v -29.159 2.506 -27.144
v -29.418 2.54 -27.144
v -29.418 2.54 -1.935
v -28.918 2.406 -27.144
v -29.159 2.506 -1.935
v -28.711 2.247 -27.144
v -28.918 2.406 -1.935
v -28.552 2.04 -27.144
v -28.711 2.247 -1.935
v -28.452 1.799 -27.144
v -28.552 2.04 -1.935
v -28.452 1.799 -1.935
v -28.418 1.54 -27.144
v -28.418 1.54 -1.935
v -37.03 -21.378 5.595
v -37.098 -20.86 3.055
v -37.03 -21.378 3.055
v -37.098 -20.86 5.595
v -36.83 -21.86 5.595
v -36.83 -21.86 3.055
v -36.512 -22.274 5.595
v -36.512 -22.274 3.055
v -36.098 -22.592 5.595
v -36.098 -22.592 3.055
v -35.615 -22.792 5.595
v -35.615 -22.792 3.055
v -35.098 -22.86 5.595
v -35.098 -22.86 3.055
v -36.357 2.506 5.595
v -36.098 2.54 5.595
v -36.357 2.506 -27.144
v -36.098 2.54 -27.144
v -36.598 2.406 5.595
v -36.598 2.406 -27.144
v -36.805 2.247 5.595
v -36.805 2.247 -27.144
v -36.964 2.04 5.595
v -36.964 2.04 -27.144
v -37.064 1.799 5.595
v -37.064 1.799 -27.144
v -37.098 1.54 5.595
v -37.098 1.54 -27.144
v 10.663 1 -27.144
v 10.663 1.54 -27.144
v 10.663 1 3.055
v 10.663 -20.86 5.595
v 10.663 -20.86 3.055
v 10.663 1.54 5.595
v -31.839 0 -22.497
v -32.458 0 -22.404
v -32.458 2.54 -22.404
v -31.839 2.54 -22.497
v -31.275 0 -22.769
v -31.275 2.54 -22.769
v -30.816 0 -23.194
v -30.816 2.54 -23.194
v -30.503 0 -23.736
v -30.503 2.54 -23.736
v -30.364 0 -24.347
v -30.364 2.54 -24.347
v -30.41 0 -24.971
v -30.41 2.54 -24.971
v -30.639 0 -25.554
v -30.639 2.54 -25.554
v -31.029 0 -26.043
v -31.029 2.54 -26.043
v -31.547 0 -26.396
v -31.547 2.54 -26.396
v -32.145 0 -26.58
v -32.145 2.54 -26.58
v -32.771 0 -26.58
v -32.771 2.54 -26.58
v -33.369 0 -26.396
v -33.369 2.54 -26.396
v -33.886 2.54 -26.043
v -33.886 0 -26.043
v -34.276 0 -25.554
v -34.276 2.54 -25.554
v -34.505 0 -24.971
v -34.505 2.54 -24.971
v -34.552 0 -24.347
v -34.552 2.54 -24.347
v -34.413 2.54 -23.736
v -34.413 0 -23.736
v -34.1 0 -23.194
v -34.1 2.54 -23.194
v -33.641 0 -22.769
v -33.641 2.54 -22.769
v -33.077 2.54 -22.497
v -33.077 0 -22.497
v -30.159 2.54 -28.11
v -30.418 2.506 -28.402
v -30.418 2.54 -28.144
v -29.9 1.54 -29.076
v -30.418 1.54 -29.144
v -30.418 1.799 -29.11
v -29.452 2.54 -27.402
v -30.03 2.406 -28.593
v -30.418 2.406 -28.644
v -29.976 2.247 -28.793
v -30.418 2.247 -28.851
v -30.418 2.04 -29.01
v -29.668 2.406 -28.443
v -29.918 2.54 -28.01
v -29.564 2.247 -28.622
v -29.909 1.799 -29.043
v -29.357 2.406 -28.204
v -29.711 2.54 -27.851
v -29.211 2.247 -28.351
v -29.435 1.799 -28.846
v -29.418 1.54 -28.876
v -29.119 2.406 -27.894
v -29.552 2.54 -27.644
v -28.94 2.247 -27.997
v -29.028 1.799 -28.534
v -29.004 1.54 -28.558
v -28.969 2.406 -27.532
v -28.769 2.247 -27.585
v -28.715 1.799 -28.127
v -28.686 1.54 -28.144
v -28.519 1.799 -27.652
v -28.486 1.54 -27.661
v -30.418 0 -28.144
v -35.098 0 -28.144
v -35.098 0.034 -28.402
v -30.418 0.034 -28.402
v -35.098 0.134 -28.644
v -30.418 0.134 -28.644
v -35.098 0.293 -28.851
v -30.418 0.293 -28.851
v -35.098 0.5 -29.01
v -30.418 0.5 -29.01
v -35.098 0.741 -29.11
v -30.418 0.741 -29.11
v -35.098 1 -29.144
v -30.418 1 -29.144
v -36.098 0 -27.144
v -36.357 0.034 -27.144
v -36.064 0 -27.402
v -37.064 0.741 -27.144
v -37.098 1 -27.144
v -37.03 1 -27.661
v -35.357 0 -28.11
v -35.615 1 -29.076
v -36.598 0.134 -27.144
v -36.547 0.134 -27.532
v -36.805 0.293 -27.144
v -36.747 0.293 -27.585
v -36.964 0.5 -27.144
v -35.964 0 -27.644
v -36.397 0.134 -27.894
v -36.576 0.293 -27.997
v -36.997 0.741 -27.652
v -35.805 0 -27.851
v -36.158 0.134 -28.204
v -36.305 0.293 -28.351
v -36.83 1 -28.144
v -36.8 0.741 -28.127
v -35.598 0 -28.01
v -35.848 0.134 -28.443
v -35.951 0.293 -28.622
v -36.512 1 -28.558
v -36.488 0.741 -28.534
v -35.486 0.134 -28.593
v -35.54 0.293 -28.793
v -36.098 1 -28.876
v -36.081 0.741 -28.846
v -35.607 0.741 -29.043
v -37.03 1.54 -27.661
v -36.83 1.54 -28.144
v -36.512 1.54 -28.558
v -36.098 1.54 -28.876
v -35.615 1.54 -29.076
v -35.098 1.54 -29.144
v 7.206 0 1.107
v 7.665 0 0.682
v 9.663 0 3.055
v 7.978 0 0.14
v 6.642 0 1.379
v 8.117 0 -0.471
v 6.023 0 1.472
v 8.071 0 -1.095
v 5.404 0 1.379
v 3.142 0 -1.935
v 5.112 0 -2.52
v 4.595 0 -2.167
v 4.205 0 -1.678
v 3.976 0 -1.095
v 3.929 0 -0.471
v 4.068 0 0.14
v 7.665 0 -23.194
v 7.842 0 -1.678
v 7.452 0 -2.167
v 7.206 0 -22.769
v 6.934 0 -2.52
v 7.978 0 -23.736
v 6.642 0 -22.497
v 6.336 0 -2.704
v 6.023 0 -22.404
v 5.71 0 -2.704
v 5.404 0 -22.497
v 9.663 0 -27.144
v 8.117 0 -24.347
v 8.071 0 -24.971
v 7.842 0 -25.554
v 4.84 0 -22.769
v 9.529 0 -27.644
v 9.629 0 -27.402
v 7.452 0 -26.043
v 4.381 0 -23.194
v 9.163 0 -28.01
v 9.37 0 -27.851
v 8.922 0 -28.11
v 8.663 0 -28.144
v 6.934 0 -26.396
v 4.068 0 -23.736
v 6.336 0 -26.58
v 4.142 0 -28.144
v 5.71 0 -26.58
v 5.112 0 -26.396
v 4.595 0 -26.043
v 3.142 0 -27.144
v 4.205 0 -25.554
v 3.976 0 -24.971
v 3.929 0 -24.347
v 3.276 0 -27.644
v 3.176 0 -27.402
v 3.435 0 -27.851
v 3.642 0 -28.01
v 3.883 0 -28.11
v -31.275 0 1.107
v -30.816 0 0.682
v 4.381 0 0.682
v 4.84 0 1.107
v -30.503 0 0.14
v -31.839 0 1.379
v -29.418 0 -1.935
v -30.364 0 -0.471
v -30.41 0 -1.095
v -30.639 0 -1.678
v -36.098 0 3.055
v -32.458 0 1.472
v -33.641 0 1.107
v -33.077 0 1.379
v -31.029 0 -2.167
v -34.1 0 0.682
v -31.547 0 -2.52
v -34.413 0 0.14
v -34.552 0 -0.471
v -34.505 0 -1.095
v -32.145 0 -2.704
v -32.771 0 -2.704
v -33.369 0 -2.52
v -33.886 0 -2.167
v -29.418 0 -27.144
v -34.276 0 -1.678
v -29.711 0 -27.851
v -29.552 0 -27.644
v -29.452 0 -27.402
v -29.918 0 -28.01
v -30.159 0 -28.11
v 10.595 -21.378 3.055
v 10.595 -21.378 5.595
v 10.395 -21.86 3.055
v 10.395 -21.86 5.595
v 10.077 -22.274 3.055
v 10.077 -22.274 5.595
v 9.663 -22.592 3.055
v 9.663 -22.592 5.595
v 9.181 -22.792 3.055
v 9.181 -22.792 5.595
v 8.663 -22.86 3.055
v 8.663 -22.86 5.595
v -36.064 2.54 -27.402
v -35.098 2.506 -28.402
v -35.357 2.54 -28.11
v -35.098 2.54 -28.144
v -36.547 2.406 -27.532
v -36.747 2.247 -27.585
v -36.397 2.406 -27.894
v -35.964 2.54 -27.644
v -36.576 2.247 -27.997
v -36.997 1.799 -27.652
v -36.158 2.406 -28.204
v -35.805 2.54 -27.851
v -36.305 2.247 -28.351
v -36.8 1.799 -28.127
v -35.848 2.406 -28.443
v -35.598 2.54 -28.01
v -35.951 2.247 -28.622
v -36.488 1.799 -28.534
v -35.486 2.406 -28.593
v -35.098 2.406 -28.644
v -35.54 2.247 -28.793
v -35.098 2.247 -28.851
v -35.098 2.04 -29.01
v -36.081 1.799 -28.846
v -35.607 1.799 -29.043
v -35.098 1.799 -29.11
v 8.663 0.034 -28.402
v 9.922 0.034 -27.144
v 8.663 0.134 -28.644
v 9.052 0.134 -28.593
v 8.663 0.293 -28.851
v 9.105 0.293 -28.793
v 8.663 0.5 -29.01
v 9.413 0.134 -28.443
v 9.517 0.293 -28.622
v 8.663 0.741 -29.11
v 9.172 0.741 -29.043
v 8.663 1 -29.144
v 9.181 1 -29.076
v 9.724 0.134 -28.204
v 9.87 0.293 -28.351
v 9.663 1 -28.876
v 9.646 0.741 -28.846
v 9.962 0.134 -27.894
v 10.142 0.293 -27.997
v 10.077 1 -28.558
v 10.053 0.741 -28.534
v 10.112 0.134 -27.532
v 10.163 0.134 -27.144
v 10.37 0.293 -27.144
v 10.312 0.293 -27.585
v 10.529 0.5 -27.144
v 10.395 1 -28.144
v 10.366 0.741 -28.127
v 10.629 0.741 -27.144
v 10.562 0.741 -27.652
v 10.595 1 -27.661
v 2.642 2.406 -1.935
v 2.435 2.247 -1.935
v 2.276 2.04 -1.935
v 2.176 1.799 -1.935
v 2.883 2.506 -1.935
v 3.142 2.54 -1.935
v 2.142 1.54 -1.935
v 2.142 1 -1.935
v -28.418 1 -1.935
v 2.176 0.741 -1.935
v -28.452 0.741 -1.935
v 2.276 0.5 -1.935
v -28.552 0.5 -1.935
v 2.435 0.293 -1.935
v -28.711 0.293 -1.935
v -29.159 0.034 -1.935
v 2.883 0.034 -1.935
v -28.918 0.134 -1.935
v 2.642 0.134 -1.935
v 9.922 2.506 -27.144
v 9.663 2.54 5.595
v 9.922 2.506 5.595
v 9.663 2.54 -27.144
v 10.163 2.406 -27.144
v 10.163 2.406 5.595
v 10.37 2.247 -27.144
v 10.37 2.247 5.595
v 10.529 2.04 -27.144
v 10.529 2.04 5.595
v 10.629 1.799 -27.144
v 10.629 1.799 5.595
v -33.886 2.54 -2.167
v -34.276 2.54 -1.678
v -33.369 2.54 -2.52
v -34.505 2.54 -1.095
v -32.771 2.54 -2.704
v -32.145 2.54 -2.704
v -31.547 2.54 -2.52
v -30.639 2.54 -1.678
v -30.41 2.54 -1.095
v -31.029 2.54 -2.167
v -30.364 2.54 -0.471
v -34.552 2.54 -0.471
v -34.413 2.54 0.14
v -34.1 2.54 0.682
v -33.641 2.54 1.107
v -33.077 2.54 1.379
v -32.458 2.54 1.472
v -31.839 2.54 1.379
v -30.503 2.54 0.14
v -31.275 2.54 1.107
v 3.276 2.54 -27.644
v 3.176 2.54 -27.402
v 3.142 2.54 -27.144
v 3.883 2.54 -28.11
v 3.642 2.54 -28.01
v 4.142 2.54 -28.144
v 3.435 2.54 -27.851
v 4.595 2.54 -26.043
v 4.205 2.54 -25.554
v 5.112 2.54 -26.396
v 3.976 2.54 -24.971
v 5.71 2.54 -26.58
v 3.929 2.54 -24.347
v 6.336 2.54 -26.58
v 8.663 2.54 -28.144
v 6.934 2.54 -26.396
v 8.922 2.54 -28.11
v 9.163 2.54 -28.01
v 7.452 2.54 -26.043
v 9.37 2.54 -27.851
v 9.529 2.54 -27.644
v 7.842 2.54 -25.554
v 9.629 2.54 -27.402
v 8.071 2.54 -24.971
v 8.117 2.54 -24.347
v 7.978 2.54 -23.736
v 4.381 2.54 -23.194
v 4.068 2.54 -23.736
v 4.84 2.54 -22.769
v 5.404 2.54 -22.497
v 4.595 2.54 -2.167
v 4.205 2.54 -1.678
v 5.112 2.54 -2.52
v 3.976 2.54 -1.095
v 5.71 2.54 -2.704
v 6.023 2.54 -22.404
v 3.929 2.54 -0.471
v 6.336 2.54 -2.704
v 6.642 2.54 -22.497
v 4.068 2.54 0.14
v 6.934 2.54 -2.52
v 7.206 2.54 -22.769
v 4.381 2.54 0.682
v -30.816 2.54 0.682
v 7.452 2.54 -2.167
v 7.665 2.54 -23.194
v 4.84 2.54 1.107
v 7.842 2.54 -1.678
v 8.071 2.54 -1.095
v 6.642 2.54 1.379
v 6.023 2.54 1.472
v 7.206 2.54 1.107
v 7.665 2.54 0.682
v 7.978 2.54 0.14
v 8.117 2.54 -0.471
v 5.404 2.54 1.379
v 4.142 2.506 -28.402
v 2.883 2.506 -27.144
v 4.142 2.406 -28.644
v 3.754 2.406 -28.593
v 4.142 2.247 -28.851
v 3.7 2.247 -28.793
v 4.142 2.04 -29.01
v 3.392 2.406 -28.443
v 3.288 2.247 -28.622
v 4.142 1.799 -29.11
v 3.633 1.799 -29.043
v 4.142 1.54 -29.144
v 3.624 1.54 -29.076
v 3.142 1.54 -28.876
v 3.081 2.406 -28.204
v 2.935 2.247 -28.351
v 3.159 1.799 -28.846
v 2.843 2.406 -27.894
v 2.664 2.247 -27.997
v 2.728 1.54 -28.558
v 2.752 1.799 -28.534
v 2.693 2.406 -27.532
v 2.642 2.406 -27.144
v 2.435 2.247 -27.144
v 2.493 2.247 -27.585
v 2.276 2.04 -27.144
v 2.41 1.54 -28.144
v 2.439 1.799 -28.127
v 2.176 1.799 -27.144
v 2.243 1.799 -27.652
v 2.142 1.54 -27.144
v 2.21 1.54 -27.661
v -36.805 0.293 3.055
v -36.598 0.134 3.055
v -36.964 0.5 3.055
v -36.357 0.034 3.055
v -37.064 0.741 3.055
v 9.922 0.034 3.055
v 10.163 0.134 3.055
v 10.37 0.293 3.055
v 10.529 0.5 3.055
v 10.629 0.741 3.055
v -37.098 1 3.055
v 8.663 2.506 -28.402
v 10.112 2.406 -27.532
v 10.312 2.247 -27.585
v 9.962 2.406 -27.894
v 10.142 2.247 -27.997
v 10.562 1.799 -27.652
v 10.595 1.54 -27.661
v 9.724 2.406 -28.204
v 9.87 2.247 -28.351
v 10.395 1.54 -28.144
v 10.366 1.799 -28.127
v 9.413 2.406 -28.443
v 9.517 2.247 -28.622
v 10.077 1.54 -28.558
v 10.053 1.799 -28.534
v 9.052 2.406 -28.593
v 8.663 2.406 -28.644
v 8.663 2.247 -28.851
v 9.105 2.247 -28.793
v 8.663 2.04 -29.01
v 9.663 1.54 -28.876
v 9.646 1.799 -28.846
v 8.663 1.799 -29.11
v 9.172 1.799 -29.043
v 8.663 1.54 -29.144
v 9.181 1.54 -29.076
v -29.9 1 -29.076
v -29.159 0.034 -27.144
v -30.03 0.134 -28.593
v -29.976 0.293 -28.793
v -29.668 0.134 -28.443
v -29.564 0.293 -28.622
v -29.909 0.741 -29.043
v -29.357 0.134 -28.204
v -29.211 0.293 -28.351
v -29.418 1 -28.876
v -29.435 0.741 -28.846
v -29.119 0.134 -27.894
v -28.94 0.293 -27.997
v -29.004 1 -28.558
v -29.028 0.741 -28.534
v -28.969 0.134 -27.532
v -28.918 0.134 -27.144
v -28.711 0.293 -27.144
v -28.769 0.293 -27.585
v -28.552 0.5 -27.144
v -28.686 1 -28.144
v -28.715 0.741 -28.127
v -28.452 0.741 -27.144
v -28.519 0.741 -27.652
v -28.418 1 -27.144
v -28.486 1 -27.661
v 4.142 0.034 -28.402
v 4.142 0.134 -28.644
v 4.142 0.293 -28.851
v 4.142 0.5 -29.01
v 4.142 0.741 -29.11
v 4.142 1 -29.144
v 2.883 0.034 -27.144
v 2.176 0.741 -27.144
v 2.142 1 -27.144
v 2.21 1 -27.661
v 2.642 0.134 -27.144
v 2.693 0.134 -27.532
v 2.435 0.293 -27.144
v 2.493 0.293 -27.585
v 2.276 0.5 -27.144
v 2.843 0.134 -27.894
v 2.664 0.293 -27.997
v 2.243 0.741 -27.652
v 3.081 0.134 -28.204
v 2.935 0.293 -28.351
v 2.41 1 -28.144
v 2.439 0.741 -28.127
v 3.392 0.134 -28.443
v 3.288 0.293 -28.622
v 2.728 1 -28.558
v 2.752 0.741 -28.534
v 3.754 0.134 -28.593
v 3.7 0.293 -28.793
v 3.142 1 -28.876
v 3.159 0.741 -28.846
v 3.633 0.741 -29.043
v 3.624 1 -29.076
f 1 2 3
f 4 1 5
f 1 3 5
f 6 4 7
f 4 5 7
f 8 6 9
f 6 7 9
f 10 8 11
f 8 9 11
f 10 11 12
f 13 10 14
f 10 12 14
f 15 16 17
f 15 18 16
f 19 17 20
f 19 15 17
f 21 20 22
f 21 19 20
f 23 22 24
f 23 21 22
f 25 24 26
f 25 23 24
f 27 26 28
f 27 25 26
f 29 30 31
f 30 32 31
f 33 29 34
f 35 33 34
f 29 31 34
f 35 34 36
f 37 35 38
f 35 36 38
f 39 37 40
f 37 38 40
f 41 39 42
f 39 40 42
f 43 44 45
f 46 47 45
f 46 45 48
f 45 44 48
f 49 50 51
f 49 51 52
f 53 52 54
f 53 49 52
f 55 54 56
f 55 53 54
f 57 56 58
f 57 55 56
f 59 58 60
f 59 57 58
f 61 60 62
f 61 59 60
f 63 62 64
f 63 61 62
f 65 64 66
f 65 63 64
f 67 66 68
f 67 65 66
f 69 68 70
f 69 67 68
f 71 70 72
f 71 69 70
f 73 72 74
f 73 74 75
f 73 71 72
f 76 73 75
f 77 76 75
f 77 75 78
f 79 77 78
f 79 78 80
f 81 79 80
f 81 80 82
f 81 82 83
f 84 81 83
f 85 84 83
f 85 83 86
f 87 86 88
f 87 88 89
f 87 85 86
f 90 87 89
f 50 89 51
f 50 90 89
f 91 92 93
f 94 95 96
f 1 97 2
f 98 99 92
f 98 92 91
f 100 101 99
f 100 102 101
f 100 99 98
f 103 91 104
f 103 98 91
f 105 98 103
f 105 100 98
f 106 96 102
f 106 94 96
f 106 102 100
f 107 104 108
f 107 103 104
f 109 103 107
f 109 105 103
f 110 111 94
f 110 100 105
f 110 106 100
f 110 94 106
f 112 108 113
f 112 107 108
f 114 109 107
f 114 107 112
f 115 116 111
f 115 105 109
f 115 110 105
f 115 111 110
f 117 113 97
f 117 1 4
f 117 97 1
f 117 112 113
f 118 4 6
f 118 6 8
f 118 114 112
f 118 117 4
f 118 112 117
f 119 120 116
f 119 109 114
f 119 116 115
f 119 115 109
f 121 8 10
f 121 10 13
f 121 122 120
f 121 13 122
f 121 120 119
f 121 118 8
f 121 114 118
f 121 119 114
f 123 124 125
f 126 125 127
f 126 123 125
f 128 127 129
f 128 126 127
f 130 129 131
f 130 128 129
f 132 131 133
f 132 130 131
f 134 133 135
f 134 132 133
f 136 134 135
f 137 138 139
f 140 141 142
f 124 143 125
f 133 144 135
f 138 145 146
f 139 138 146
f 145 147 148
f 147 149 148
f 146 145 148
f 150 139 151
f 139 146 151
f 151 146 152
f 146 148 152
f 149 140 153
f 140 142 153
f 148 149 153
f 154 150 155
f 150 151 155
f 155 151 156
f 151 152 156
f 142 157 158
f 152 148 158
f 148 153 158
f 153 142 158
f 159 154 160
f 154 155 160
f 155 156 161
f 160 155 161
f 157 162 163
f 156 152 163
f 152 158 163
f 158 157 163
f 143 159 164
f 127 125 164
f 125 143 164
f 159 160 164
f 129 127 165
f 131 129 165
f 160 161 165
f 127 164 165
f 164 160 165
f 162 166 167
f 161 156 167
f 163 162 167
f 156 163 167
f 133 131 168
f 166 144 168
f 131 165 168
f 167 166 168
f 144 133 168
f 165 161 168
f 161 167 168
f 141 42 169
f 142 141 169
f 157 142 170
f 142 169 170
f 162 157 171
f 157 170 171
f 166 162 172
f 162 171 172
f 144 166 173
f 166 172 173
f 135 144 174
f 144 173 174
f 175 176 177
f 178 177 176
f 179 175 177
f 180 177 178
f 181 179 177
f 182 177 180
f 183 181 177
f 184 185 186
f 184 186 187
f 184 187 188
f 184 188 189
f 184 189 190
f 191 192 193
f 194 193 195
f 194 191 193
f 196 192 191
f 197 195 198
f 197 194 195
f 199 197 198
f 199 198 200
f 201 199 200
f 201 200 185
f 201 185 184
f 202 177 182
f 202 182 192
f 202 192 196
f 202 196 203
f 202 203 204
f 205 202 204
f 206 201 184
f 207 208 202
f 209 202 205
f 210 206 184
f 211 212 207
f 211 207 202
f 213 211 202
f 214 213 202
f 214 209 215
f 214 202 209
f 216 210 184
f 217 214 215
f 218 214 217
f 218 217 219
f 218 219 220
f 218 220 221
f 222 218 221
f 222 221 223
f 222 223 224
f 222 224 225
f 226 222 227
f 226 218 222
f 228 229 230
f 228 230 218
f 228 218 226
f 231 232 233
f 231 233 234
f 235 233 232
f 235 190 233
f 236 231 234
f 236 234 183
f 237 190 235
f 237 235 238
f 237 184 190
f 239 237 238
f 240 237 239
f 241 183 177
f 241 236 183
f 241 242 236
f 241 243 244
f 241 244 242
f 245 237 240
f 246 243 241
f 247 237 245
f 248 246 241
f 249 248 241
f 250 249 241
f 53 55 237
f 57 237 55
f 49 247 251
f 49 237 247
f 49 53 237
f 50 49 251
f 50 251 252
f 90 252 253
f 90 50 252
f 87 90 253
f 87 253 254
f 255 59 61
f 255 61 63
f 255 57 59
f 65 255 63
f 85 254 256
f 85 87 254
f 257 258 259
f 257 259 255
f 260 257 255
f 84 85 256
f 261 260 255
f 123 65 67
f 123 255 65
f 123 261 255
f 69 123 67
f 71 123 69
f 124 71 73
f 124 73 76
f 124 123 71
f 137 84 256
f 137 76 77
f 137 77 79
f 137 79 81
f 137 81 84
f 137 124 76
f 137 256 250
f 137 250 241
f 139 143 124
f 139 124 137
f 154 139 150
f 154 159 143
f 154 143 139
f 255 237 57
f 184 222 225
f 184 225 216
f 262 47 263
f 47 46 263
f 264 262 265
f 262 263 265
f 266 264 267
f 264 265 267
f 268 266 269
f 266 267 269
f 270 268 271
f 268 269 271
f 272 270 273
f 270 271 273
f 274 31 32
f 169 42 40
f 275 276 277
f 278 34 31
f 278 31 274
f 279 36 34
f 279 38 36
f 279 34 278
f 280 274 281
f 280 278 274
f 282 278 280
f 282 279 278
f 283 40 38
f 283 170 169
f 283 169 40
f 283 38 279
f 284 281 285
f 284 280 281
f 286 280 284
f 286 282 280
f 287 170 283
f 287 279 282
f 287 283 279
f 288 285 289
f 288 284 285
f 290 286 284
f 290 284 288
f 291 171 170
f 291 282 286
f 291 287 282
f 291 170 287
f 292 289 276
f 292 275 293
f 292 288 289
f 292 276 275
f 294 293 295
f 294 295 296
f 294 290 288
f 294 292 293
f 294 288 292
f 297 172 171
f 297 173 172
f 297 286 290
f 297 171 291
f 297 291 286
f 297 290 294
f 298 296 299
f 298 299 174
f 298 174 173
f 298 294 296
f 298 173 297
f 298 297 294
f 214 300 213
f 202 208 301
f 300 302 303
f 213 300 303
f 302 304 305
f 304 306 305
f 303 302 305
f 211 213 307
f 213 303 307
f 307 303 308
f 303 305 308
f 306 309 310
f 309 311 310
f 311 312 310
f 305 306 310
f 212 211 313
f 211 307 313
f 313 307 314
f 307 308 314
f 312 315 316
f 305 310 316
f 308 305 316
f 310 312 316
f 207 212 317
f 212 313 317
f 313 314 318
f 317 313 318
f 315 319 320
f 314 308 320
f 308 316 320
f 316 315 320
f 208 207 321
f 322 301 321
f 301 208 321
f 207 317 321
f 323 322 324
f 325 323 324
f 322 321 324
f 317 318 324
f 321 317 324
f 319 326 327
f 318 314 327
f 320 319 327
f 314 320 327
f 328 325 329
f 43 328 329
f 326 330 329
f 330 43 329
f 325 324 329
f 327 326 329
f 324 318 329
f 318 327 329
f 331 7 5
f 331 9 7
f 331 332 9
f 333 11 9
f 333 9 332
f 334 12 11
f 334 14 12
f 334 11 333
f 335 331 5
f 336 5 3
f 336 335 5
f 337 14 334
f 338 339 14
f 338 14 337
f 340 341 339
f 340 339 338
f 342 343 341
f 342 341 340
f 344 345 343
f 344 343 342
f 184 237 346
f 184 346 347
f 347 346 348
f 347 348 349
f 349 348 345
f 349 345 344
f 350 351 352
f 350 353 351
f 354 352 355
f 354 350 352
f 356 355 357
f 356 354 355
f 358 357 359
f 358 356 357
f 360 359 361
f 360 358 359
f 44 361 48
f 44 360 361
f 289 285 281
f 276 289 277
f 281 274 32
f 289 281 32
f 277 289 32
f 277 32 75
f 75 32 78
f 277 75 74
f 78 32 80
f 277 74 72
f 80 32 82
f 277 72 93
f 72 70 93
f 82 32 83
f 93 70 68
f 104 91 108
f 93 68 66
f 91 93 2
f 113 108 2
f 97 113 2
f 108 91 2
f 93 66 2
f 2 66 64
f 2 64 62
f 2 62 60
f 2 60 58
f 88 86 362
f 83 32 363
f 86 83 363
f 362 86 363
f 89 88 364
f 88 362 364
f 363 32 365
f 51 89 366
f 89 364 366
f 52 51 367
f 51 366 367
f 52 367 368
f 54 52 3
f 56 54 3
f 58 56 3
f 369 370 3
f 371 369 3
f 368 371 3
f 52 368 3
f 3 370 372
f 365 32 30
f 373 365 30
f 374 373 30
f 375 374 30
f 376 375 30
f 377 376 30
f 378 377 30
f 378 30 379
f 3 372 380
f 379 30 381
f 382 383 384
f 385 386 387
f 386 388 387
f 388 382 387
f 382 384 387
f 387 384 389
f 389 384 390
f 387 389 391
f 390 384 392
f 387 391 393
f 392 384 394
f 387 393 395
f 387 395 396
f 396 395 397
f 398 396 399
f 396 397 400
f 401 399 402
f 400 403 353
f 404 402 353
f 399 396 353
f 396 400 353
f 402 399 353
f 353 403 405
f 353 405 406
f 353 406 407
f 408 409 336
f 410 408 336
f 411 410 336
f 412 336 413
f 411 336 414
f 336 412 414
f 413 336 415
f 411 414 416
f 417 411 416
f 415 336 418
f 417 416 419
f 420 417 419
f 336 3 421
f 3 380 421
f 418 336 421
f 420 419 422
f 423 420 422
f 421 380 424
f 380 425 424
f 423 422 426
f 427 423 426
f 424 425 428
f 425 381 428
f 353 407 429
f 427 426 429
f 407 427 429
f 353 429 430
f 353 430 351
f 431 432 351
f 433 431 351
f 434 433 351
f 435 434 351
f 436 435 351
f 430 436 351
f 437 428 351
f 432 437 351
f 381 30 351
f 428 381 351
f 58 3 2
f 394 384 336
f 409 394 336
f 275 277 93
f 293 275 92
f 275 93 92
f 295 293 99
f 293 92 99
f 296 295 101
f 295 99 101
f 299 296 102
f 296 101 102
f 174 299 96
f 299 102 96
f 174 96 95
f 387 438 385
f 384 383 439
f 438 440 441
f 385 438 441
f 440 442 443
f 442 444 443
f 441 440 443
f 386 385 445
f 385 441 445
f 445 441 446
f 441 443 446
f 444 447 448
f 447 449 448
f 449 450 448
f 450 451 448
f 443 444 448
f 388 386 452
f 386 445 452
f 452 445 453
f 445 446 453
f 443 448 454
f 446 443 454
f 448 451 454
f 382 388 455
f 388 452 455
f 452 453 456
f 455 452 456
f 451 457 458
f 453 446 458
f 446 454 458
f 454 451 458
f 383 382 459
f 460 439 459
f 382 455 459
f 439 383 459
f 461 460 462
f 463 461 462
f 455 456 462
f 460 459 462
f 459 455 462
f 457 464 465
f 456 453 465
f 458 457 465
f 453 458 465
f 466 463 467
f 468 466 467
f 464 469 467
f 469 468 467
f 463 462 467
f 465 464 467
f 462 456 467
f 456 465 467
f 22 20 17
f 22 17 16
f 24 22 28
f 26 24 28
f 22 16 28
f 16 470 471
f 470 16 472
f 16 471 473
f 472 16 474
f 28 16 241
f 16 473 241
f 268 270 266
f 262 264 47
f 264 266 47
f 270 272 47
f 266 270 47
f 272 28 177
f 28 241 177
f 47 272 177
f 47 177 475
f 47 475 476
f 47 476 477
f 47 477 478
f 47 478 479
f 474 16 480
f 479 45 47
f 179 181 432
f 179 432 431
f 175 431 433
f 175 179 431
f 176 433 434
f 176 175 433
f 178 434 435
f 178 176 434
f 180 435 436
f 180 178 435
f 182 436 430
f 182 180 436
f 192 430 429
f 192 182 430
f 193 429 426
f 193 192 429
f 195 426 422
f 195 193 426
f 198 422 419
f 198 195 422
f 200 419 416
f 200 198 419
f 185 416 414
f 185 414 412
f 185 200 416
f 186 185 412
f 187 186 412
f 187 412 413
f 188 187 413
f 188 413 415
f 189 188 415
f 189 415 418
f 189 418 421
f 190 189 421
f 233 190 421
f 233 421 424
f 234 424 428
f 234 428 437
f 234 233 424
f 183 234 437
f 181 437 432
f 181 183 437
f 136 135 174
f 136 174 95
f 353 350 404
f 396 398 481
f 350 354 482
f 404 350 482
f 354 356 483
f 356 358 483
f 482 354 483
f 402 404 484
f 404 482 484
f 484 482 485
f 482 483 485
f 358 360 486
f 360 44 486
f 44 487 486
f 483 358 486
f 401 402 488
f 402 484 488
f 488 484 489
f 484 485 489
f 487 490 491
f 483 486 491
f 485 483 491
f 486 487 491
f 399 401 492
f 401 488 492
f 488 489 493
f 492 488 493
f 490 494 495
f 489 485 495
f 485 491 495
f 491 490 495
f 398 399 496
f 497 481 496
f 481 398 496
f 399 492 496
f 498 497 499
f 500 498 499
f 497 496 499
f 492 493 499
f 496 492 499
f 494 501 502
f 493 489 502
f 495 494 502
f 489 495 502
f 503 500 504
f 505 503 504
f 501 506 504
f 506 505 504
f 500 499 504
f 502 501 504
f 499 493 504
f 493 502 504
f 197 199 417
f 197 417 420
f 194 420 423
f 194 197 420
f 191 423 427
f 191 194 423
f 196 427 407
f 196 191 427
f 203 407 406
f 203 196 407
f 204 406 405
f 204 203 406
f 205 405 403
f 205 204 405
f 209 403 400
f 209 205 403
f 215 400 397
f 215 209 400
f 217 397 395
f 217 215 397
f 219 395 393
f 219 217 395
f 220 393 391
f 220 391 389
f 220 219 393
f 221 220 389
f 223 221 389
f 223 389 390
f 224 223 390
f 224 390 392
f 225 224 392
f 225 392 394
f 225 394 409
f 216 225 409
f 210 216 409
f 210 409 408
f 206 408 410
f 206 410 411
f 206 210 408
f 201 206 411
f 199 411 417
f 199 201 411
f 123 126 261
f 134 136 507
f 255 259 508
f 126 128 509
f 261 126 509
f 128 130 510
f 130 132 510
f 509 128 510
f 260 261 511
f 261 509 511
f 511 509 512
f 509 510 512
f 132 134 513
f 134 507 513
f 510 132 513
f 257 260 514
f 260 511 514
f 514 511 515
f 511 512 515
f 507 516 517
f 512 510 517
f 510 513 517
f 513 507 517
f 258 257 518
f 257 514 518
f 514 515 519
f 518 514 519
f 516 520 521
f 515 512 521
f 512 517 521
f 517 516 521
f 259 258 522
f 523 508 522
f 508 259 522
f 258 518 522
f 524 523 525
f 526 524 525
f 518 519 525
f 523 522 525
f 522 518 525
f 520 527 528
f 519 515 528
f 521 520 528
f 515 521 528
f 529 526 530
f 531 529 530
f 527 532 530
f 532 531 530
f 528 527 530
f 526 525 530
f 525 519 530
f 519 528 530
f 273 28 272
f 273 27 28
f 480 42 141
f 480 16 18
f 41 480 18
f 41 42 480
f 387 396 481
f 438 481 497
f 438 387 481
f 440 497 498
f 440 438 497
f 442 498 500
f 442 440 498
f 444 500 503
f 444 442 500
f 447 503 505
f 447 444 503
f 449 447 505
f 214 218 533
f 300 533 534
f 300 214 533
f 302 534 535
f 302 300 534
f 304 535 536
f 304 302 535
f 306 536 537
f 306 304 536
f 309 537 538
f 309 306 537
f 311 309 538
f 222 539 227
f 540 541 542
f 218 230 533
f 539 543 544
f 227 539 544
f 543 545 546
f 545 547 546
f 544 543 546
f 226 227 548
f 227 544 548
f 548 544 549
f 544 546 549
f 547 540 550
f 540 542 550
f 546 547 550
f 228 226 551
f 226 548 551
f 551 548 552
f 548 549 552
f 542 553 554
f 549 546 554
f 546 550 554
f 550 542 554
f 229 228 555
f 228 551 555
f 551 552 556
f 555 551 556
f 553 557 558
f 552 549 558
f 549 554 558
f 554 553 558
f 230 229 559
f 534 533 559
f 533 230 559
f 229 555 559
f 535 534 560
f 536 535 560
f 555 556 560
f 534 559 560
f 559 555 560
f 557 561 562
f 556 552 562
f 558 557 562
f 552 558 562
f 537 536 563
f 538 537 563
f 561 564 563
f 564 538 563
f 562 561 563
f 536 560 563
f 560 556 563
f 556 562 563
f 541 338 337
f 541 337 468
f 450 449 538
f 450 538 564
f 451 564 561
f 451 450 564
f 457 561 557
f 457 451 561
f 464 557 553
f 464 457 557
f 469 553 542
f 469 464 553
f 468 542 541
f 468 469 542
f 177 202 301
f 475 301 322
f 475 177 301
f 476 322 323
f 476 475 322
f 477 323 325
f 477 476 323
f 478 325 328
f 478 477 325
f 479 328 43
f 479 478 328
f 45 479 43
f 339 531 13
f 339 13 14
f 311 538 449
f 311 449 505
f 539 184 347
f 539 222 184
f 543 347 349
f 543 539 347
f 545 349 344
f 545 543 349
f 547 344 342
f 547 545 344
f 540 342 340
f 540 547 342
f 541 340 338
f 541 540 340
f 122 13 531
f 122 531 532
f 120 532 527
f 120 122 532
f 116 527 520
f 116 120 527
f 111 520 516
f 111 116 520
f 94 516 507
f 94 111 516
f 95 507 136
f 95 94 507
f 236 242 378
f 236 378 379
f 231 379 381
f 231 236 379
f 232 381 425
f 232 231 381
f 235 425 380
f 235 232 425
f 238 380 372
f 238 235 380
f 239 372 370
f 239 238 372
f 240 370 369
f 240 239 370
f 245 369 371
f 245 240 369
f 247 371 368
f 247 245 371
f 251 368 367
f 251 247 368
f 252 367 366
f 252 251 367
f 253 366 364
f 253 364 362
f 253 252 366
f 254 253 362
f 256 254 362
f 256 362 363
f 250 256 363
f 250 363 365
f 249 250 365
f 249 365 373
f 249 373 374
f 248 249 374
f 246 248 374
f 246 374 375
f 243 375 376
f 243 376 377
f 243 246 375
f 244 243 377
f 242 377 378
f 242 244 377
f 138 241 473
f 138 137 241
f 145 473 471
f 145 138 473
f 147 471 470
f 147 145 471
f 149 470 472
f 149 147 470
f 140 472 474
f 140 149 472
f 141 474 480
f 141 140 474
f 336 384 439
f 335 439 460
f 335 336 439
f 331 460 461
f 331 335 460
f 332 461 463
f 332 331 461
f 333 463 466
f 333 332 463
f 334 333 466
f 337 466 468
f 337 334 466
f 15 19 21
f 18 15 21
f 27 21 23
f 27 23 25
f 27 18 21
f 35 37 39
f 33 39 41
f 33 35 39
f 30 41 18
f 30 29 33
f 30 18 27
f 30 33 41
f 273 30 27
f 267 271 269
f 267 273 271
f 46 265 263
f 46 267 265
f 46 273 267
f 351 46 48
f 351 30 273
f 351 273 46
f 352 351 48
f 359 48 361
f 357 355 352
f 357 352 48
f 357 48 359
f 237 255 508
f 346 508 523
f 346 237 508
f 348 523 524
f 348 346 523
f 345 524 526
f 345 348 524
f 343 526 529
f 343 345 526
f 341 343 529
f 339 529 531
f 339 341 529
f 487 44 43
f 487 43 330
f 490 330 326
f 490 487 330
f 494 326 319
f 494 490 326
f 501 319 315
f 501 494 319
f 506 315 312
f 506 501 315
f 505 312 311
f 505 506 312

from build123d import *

# Parameters (mm, degrees)
SKETCH1_R           = 2.1
BOSS_EXTRUDE1_DEPTH = 2.54
SKETCH2_W           = 47.761
SKETCH2_H           = 2.54
BOSS_EXTRUDE2_DEPTH = 25.4
FILLET1_R           = 2
FILLET2_R           = 1


with BuildPart() as part:
    # Sketch1 → Boss-Extrude1 (new body)
    with BuildSketch(Plane(origin=(0, 0, 0), x_dir=(1, 0, 0), z_dir=(0, 1, 0))):
        Polygon((-28.418010921, 1.935035563), (2.141991551, 1.935035563), (2.141991551, 29.143665766), (10.663279773, 29.143665766), (10.663279773, -3.055333898), (2.086284412, -3.055333898), (-28.52072334, -3.055333898), (-37.097720227, -3.055333898), (-37.097720227, 29.143665766), (-28.418010921, 29.143665766), align=None)
        with Locations(Location((-32.457720227, 24.503665766, 0), (0, 0, 270))):
            Circle(SKETCH1_R, mode=Mode.SUBTRACT)
        with Locations(Location((-32.457720227, 0.627665766, 0), (0, 0, 270))):
            Circle(SKETCH1_R, mode=Mode.SUBTRACT)
        with Locations(Location((6.023279773, 24.503665766, 0), (0, 0, 270))):
            Circle(SKETCH1_R, mode=Mode.SUBTRACT)
        with Locations(Location((6.023279773, 0.627665766, 0), (0, 0, 270))):
            Circle(SKETCH1_R, mode=Mode.SUBTRACT)
    extrude(amount=BOSS_EXTRUDE1_DEPTH)

    # Sketch2 → Boss-Extrude2 (add)
    with BuildSketch(Plane.XZ.offset(-2.54)):
        with Locations((-13.217220227, 4.325333898)):
            Rectangle(SKETCH2_W, SKETCH2_H)
    extrude(amount=BOSS_EXTRUDE2_DEPTH)

    # Fillet1
    fillet1_edges = [part.edges().sort_by_distance(p)[0] for p in [
        (2.141991551, 1.27, -29.143665766),
        (10.663279773, 1.27, -29.143665766),
        (-37.097720227, 1.27, -29.143665766),
        (-28.418010921, 1.27, -29.143665766),
        (-37.097720227, -22.86, 4.325333898),
        (10.663279773, -22.86, 4.325333898),
    ]]
    fillet(fillet1_edges, radius=FILLET1_R)

    # Fillet2
    fillet2_edges = [part.edges().sort_by_distance(p)[0] for p in [
        (10.663279773, 0, -12.044165934),
        (-28.418010921, 0, -14.539350664),
        (10.663279773, 2.54, -10.774165934),
        (-28.418010921, 2.54, -14.539350664),
        (-32.757865574, 0, -29.143665766),
        (-32.757865574, 2.54, -29.143665766),
        (2.141991551, 0, -14.539350664),
        (6.402635662, 0, -29.143665766),
        (-37.097720227, 0, -12.044165934),
        (10.077493335, 0, -28.557879329),
        (2.727777988, 0, -28.557879329),
        (-36.511933789, 0, -28.557879329),
        (-29.003797359, 0, -28.557879329),
        (-37.097720227, 2.54, -10.774165934),
        (6.402635662, 2.54, -29.143665766),
        (2.141991551, 2.54, -14.539350664),
        (10.077493335, 2.54, -28.557879329),
        (2.727777988, 2.54, -28.557879329),
        (-36.511933789, 2.54, -28.557879329),
        (-29.003797359, 2.54, -28.557879329),
    ]]
    fillet(fillet2_edges, radius=FILLET2_R)


solid = part.part
